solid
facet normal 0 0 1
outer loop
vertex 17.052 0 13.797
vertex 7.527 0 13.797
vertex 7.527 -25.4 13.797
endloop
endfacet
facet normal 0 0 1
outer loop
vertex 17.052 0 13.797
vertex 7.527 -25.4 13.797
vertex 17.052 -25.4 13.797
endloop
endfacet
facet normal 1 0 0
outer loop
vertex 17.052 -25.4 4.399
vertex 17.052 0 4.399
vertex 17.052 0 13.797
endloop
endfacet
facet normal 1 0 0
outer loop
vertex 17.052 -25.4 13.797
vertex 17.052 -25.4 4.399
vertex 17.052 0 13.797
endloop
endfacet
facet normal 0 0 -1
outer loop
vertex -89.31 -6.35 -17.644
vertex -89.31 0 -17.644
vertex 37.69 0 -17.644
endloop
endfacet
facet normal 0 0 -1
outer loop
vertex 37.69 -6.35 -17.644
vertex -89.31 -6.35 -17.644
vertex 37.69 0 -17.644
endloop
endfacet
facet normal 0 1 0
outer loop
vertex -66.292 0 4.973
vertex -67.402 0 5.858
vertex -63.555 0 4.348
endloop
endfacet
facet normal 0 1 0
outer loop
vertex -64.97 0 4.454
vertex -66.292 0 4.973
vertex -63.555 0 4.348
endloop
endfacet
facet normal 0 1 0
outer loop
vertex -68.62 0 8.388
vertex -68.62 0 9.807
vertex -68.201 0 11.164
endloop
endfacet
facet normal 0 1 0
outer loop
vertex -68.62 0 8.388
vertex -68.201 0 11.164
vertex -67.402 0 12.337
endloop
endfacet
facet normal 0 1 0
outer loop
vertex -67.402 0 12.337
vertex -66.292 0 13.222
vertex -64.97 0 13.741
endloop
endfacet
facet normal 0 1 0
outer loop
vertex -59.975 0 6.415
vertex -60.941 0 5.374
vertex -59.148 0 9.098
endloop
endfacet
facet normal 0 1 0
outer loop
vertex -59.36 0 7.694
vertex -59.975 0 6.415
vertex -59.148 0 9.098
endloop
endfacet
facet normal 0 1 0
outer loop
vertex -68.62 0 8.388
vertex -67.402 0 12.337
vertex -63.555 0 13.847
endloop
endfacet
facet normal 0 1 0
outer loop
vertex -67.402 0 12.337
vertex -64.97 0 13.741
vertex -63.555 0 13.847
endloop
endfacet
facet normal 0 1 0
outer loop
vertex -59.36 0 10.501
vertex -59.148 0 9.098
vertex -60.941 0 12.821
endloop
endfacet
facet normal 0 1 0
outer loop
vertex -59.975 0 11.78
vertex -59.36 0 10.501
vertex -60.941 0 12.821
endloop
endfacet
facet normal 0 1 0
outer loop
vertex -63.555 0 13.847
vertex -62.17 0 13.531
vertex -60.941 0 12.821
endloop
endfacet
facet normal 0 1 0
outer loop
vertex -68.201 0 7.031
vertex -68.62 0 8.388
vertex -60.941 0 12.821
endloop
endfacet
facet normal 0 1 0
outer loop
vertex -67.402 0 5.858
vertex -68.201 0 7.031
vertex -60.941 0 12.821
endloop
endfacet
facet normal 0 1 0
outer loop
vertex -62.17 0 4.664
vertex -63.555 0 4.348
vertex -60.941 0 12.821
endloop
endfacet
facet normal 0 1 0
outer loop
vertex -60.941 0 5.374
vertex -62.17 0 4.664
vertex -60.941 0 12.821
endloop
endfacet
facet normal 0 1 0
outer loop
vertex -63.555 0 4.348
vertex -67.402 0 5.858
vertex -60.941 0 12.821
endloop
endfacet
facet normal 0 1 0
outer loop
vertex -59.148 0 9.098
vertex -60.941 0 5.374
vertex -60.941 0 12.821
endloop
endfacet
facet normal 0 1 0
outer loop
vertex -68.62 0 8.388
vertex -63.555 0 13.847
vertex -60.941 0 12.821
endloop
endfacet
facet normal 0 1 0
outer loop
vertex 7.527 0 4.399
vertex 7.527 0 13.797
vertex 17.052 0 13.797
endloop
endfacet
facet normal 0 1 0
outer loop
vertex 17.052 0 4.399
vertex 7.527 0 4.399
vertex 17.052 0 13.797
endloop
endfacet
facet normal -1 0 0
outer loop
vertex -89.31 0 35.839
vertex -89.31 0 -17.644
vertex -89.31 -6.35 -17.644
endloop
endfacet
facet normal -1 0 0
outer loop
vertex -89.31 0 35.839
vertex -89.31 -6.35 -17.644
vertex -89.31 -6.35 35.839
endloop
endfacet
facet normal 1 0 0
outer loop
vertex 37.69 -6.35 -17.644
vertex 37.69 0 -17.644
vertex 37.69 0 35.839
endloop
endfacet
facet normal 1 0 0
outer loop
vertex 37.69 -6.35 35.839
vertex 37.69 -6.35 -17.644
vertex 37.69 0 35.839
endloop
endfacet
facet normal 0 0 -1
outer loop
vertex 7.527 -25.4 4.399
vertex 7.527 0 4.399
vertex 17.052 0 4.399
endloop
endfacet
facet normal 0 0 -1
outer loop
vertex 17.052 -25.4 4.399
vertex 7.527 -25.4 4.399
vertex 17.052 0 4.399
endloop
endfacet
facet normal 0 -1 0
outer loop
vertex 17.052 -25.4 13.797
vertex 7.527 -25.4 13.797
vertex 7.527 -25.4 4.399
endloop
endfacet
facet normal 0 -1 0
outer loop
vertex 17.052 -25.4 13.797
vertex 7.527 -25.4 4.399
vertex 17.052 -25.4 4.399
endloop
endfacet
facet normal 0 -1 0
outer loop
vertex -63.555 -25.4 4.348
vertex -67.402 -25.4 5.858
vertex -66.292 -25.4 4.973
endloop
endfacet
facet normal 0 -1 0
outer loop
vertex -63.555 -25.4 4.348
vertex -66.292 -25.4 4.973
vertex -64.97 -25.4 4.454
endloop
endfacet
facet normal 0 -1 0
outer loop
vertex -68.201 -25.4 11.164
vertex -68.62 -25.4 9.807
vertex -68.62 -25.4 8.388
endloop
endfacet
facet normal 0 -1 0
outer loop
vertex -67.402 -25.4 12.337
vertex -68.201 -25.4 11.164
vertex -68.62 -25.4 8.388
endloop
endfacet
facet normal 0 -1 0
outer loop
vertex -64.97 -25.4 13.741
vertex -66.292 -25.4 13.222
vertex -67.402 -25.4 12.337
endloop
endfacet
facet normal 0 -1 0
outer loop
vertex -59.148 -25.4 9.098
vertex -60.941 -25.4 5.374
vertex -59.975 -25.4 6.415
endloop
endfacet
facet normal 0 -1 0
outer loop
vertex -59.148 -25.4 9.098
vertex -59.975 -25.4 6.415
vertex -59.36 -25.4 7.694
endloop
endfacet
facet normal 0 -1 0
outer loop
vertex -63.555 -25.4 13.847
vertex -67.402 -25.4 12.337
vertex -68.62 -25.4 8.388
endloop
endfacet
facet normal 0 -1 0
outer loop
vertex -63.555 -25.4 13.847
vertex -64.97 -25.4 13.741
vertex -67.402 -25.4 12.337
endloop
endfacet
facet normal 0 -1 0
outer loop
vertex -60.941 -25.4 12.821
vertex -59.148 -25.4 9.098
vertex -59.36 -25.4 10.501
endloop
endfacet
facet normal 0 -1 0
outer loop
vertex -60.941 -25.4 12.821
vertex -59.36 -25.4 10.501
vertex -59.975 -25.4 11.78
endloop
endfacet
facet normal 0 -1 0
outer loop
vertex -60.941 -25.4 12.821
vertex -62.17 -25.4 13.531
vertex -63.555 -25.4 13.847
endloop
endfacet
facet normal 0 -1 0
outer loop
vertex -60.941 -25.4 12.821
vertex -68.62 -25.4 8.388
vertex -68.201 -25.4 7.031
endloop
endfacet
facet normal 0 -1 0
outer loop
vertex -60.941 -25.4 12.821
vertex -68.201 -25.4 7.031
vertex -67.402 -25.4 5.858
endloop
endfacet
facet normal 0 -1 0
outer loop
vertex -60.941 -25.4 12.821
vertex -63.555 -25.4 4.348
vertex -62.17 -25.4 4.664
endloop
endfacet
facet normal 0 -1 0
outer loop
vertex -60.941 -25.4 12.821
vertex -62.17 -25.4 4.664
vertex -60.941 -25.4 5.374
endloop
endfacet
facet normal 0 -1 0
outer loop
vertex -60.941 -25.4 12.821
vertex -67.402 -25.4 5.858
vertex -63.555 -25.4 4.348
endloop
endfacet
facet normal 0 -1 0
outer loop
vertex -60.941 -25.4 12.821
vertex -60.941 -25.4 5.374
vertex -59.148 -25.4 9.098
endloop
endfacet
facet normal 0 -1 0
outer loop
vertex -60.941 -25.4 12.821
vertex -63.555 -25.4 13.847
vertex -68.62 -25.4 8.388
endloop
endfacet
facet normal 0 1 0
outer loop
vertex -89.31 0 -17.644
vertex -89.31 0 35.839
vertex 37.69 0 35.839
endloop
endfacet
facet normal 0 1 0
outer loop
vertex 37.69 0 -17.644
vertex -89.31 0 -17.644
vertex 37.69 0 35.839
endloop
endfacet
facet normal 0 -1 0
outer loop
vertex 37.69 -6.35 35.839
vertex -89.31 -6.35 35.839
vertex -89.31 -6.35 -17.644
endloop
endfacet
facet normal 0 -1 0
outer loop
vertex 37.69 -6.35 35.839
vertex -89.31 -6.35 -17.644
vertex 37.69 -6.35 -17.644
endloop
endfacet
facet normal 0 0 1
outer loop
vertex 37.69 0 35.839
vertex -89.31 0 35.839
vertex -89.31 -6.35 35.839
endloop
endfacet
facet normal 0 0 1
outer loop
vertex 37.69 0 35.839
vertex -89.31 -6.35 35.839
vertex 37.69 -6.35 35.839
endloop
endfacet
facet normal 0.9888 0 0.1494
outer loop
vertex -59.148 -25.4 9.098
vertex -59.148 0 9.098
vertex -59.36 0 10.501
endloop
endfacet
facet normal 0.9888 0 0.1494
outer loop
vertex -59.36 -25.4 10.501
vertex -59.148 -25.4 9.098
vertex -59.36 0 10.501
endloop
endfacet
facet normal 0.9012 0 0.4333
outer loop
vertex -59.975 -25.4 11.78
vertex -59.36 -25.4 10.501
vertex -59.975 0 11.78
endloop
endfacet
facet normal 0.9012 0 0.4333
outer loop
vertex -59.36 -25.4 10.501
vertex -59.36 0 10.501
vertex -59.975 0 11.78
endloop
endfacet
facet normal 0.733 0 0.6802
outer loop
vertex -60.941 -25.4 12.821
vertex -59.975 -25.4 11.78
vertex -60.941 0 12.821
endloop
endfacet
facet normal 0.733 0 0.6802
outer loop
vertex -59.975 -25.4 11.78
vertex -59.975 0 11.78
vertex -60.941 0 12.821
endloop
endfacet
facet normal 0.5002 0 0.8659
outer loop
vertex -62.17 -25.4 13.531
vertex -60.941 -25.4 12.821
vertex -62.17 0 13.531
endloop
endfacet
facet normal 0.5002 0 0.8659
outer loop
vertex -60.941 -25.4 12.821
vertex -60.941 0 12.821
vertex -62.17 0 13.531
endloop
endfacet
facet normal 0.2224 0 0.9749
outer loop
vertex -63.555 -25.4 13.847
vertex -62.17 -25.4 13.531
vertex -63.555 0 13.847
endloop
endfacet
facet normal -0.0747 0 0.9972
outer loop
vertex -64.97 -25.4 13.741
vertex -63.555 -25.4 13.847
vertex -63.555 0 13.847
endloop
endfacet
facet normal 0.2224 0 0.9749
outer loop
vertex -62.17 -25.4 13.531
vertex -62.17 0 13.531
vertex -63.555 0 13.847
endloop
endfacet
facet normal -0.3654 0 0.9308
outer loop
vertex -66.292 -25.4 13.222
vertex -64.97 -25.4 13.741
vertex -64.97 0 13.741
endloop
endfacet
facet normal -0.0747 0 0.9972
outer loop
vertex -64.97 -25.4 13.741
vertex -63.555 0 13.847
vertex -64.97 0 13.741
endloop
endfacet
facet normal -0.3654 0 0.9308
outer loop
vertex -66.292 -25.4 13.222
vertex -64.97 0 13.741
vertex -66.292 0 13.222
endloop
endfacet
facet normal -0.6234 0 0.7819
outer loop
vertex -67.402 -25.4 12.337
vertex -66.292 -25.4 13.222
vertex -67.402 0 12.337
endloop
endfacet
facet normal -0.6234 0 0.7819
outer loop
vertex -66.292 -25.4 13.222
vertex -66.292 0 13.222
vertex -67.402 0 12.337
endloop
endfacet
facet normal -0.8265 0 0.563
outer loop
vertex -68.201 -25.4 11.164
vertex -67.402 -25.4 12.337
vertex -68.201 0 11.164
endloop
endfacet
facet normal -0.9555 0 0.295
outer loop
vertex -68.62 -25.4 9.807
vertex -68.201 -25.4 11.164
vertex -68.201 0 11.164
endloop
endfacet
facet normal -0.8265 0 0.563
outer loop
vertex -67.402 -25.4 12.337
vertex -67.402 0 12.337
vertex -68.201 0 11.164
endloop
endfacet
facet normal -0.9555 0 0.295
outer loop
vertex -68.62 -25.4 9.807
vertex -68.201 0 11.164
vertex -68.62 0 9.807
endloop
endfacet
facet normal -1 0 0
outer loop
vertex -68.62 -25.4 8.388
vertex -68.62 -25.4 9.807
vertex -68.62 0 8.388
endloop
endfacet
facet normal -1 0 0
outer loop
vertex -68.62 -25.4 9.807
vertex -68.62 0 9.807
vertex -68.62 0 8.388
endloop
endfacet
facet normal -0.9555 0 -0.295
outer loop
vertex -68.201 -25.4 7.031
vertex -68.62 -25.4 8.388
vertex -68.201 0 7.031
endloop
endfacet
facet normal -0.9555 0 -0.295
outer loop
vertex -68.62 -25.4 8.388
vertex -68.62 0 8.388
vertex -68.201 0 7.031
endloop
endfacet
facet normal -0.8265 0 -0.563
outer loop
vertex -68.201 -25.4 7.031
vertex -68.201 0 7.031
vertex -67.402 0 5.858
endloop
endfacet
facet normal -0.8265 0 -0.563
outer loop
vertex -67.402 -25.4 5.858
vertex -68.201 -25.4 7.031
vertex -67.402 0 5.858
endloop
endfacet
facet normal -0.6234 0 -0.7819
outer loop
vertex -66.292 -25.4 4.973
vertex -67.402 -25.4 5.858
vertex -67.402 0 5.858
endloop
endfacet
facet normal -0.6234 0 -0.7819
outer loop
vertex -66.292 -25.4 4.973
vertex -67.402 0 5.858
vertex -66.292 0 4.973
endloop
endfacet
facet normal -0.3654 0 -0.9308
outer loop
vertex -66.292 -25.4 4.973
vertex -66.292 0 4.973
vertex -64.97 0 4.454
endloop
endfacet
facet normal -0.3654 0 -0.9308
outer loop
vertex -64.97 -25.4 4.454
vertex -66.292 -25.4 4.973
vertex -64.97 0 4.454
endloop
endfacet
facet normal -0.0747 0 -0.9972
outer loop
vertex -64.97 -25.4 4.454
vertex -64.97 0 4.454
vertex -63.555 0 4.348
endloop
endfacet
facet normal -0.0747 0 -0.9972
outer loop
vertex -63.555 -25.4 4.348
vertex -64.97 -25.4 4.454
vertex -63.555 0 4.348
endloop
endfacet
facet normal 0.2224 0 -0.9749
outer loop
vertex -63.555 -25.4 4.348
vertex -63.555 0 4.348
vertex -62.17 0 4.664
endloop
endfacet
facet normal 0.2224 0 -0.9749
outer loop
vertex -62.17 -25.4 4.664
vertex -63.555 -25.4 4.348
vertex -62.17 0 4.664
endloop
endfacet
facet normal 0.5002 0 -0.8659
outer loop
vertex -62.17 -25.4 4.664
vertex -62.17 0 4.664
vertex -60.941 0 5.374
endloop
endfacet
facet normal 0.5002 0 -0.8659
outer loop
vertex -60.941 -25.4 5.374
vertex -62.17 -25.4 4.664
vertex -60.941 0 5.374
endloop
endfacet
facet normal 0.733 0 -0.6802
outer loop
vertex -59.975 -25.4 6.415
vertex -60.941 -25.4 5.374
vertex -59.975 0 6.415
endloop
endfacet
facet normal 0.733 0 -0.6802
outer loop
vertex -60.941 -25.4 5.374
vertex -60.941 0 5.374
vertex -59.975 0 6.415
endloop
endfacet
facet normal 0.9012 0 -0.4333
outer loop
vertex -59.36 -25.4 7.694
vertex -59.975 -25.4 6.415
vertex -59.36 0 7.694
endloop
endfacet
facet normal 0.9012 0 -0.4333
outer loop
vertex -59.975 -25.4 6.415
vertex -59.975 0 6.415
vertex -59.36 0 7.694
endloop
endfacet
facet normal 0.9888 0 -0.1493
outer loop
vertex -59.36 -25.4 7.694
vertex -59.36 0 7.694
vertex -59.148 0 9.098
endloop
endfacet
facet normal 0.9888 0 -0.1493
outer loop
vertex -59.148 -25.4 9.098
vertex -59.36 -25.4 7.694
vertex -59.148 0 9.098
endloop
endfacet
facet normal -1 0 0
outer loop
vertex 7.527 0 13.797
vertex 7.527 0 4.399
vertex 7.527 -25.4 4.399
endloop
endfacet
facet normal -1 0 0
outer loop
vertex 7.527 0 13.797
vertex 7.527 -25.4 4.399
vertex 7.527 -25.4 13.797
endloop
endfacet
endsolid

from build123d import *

# Parameters (mm, degrees)
F0_W     = 127
F0_H     = 53.482489
F0_R     = 4.7625
F0_W_2   = 9.525
F0_H_2   = 9.398
F1_DEPTH = 6.35
F2_DEPTH = 25.4


with BuildPart() as f1:
    # F0 (on Front) → F1 (new body)
    with BuildSketch(Plane.XZ):
        with Locations((-25.810427, 9.097536)):
            Rectangle(F0_W, F0_H)
        with Locations((-63.910427, 9.097537)):
            Circle(F0_R, mode=Mode.SUBTRACT)
        with Locations((12.289573, 9.097537)):
            Rectangle(F0_W_2, F0_H_2, mode=Mode.SUBTRACT)
        with Locations((-63.910427, 9.097537)):
            Circle(F0_R)
        with Locations((12.289573, 9.097537)):
            Rectangle(F0_W_2, F0_H_2)
    extrude(amount=F1_DEPTH)


with BuildPart() as f2:
    # F0 (on Front) → F2 (new body)
    with BuildSketch(Plane.XZ):
        with Locations((-63.910427, 9.097537)):
            Circle(F0_R)
        with Locations((12.289573, 9.097537)):
            Rectangle(F0_W_2, F0_H_2)
    extrude(amount=F2_DEPTH)


solid = Compound([f1.part, f2.part])
